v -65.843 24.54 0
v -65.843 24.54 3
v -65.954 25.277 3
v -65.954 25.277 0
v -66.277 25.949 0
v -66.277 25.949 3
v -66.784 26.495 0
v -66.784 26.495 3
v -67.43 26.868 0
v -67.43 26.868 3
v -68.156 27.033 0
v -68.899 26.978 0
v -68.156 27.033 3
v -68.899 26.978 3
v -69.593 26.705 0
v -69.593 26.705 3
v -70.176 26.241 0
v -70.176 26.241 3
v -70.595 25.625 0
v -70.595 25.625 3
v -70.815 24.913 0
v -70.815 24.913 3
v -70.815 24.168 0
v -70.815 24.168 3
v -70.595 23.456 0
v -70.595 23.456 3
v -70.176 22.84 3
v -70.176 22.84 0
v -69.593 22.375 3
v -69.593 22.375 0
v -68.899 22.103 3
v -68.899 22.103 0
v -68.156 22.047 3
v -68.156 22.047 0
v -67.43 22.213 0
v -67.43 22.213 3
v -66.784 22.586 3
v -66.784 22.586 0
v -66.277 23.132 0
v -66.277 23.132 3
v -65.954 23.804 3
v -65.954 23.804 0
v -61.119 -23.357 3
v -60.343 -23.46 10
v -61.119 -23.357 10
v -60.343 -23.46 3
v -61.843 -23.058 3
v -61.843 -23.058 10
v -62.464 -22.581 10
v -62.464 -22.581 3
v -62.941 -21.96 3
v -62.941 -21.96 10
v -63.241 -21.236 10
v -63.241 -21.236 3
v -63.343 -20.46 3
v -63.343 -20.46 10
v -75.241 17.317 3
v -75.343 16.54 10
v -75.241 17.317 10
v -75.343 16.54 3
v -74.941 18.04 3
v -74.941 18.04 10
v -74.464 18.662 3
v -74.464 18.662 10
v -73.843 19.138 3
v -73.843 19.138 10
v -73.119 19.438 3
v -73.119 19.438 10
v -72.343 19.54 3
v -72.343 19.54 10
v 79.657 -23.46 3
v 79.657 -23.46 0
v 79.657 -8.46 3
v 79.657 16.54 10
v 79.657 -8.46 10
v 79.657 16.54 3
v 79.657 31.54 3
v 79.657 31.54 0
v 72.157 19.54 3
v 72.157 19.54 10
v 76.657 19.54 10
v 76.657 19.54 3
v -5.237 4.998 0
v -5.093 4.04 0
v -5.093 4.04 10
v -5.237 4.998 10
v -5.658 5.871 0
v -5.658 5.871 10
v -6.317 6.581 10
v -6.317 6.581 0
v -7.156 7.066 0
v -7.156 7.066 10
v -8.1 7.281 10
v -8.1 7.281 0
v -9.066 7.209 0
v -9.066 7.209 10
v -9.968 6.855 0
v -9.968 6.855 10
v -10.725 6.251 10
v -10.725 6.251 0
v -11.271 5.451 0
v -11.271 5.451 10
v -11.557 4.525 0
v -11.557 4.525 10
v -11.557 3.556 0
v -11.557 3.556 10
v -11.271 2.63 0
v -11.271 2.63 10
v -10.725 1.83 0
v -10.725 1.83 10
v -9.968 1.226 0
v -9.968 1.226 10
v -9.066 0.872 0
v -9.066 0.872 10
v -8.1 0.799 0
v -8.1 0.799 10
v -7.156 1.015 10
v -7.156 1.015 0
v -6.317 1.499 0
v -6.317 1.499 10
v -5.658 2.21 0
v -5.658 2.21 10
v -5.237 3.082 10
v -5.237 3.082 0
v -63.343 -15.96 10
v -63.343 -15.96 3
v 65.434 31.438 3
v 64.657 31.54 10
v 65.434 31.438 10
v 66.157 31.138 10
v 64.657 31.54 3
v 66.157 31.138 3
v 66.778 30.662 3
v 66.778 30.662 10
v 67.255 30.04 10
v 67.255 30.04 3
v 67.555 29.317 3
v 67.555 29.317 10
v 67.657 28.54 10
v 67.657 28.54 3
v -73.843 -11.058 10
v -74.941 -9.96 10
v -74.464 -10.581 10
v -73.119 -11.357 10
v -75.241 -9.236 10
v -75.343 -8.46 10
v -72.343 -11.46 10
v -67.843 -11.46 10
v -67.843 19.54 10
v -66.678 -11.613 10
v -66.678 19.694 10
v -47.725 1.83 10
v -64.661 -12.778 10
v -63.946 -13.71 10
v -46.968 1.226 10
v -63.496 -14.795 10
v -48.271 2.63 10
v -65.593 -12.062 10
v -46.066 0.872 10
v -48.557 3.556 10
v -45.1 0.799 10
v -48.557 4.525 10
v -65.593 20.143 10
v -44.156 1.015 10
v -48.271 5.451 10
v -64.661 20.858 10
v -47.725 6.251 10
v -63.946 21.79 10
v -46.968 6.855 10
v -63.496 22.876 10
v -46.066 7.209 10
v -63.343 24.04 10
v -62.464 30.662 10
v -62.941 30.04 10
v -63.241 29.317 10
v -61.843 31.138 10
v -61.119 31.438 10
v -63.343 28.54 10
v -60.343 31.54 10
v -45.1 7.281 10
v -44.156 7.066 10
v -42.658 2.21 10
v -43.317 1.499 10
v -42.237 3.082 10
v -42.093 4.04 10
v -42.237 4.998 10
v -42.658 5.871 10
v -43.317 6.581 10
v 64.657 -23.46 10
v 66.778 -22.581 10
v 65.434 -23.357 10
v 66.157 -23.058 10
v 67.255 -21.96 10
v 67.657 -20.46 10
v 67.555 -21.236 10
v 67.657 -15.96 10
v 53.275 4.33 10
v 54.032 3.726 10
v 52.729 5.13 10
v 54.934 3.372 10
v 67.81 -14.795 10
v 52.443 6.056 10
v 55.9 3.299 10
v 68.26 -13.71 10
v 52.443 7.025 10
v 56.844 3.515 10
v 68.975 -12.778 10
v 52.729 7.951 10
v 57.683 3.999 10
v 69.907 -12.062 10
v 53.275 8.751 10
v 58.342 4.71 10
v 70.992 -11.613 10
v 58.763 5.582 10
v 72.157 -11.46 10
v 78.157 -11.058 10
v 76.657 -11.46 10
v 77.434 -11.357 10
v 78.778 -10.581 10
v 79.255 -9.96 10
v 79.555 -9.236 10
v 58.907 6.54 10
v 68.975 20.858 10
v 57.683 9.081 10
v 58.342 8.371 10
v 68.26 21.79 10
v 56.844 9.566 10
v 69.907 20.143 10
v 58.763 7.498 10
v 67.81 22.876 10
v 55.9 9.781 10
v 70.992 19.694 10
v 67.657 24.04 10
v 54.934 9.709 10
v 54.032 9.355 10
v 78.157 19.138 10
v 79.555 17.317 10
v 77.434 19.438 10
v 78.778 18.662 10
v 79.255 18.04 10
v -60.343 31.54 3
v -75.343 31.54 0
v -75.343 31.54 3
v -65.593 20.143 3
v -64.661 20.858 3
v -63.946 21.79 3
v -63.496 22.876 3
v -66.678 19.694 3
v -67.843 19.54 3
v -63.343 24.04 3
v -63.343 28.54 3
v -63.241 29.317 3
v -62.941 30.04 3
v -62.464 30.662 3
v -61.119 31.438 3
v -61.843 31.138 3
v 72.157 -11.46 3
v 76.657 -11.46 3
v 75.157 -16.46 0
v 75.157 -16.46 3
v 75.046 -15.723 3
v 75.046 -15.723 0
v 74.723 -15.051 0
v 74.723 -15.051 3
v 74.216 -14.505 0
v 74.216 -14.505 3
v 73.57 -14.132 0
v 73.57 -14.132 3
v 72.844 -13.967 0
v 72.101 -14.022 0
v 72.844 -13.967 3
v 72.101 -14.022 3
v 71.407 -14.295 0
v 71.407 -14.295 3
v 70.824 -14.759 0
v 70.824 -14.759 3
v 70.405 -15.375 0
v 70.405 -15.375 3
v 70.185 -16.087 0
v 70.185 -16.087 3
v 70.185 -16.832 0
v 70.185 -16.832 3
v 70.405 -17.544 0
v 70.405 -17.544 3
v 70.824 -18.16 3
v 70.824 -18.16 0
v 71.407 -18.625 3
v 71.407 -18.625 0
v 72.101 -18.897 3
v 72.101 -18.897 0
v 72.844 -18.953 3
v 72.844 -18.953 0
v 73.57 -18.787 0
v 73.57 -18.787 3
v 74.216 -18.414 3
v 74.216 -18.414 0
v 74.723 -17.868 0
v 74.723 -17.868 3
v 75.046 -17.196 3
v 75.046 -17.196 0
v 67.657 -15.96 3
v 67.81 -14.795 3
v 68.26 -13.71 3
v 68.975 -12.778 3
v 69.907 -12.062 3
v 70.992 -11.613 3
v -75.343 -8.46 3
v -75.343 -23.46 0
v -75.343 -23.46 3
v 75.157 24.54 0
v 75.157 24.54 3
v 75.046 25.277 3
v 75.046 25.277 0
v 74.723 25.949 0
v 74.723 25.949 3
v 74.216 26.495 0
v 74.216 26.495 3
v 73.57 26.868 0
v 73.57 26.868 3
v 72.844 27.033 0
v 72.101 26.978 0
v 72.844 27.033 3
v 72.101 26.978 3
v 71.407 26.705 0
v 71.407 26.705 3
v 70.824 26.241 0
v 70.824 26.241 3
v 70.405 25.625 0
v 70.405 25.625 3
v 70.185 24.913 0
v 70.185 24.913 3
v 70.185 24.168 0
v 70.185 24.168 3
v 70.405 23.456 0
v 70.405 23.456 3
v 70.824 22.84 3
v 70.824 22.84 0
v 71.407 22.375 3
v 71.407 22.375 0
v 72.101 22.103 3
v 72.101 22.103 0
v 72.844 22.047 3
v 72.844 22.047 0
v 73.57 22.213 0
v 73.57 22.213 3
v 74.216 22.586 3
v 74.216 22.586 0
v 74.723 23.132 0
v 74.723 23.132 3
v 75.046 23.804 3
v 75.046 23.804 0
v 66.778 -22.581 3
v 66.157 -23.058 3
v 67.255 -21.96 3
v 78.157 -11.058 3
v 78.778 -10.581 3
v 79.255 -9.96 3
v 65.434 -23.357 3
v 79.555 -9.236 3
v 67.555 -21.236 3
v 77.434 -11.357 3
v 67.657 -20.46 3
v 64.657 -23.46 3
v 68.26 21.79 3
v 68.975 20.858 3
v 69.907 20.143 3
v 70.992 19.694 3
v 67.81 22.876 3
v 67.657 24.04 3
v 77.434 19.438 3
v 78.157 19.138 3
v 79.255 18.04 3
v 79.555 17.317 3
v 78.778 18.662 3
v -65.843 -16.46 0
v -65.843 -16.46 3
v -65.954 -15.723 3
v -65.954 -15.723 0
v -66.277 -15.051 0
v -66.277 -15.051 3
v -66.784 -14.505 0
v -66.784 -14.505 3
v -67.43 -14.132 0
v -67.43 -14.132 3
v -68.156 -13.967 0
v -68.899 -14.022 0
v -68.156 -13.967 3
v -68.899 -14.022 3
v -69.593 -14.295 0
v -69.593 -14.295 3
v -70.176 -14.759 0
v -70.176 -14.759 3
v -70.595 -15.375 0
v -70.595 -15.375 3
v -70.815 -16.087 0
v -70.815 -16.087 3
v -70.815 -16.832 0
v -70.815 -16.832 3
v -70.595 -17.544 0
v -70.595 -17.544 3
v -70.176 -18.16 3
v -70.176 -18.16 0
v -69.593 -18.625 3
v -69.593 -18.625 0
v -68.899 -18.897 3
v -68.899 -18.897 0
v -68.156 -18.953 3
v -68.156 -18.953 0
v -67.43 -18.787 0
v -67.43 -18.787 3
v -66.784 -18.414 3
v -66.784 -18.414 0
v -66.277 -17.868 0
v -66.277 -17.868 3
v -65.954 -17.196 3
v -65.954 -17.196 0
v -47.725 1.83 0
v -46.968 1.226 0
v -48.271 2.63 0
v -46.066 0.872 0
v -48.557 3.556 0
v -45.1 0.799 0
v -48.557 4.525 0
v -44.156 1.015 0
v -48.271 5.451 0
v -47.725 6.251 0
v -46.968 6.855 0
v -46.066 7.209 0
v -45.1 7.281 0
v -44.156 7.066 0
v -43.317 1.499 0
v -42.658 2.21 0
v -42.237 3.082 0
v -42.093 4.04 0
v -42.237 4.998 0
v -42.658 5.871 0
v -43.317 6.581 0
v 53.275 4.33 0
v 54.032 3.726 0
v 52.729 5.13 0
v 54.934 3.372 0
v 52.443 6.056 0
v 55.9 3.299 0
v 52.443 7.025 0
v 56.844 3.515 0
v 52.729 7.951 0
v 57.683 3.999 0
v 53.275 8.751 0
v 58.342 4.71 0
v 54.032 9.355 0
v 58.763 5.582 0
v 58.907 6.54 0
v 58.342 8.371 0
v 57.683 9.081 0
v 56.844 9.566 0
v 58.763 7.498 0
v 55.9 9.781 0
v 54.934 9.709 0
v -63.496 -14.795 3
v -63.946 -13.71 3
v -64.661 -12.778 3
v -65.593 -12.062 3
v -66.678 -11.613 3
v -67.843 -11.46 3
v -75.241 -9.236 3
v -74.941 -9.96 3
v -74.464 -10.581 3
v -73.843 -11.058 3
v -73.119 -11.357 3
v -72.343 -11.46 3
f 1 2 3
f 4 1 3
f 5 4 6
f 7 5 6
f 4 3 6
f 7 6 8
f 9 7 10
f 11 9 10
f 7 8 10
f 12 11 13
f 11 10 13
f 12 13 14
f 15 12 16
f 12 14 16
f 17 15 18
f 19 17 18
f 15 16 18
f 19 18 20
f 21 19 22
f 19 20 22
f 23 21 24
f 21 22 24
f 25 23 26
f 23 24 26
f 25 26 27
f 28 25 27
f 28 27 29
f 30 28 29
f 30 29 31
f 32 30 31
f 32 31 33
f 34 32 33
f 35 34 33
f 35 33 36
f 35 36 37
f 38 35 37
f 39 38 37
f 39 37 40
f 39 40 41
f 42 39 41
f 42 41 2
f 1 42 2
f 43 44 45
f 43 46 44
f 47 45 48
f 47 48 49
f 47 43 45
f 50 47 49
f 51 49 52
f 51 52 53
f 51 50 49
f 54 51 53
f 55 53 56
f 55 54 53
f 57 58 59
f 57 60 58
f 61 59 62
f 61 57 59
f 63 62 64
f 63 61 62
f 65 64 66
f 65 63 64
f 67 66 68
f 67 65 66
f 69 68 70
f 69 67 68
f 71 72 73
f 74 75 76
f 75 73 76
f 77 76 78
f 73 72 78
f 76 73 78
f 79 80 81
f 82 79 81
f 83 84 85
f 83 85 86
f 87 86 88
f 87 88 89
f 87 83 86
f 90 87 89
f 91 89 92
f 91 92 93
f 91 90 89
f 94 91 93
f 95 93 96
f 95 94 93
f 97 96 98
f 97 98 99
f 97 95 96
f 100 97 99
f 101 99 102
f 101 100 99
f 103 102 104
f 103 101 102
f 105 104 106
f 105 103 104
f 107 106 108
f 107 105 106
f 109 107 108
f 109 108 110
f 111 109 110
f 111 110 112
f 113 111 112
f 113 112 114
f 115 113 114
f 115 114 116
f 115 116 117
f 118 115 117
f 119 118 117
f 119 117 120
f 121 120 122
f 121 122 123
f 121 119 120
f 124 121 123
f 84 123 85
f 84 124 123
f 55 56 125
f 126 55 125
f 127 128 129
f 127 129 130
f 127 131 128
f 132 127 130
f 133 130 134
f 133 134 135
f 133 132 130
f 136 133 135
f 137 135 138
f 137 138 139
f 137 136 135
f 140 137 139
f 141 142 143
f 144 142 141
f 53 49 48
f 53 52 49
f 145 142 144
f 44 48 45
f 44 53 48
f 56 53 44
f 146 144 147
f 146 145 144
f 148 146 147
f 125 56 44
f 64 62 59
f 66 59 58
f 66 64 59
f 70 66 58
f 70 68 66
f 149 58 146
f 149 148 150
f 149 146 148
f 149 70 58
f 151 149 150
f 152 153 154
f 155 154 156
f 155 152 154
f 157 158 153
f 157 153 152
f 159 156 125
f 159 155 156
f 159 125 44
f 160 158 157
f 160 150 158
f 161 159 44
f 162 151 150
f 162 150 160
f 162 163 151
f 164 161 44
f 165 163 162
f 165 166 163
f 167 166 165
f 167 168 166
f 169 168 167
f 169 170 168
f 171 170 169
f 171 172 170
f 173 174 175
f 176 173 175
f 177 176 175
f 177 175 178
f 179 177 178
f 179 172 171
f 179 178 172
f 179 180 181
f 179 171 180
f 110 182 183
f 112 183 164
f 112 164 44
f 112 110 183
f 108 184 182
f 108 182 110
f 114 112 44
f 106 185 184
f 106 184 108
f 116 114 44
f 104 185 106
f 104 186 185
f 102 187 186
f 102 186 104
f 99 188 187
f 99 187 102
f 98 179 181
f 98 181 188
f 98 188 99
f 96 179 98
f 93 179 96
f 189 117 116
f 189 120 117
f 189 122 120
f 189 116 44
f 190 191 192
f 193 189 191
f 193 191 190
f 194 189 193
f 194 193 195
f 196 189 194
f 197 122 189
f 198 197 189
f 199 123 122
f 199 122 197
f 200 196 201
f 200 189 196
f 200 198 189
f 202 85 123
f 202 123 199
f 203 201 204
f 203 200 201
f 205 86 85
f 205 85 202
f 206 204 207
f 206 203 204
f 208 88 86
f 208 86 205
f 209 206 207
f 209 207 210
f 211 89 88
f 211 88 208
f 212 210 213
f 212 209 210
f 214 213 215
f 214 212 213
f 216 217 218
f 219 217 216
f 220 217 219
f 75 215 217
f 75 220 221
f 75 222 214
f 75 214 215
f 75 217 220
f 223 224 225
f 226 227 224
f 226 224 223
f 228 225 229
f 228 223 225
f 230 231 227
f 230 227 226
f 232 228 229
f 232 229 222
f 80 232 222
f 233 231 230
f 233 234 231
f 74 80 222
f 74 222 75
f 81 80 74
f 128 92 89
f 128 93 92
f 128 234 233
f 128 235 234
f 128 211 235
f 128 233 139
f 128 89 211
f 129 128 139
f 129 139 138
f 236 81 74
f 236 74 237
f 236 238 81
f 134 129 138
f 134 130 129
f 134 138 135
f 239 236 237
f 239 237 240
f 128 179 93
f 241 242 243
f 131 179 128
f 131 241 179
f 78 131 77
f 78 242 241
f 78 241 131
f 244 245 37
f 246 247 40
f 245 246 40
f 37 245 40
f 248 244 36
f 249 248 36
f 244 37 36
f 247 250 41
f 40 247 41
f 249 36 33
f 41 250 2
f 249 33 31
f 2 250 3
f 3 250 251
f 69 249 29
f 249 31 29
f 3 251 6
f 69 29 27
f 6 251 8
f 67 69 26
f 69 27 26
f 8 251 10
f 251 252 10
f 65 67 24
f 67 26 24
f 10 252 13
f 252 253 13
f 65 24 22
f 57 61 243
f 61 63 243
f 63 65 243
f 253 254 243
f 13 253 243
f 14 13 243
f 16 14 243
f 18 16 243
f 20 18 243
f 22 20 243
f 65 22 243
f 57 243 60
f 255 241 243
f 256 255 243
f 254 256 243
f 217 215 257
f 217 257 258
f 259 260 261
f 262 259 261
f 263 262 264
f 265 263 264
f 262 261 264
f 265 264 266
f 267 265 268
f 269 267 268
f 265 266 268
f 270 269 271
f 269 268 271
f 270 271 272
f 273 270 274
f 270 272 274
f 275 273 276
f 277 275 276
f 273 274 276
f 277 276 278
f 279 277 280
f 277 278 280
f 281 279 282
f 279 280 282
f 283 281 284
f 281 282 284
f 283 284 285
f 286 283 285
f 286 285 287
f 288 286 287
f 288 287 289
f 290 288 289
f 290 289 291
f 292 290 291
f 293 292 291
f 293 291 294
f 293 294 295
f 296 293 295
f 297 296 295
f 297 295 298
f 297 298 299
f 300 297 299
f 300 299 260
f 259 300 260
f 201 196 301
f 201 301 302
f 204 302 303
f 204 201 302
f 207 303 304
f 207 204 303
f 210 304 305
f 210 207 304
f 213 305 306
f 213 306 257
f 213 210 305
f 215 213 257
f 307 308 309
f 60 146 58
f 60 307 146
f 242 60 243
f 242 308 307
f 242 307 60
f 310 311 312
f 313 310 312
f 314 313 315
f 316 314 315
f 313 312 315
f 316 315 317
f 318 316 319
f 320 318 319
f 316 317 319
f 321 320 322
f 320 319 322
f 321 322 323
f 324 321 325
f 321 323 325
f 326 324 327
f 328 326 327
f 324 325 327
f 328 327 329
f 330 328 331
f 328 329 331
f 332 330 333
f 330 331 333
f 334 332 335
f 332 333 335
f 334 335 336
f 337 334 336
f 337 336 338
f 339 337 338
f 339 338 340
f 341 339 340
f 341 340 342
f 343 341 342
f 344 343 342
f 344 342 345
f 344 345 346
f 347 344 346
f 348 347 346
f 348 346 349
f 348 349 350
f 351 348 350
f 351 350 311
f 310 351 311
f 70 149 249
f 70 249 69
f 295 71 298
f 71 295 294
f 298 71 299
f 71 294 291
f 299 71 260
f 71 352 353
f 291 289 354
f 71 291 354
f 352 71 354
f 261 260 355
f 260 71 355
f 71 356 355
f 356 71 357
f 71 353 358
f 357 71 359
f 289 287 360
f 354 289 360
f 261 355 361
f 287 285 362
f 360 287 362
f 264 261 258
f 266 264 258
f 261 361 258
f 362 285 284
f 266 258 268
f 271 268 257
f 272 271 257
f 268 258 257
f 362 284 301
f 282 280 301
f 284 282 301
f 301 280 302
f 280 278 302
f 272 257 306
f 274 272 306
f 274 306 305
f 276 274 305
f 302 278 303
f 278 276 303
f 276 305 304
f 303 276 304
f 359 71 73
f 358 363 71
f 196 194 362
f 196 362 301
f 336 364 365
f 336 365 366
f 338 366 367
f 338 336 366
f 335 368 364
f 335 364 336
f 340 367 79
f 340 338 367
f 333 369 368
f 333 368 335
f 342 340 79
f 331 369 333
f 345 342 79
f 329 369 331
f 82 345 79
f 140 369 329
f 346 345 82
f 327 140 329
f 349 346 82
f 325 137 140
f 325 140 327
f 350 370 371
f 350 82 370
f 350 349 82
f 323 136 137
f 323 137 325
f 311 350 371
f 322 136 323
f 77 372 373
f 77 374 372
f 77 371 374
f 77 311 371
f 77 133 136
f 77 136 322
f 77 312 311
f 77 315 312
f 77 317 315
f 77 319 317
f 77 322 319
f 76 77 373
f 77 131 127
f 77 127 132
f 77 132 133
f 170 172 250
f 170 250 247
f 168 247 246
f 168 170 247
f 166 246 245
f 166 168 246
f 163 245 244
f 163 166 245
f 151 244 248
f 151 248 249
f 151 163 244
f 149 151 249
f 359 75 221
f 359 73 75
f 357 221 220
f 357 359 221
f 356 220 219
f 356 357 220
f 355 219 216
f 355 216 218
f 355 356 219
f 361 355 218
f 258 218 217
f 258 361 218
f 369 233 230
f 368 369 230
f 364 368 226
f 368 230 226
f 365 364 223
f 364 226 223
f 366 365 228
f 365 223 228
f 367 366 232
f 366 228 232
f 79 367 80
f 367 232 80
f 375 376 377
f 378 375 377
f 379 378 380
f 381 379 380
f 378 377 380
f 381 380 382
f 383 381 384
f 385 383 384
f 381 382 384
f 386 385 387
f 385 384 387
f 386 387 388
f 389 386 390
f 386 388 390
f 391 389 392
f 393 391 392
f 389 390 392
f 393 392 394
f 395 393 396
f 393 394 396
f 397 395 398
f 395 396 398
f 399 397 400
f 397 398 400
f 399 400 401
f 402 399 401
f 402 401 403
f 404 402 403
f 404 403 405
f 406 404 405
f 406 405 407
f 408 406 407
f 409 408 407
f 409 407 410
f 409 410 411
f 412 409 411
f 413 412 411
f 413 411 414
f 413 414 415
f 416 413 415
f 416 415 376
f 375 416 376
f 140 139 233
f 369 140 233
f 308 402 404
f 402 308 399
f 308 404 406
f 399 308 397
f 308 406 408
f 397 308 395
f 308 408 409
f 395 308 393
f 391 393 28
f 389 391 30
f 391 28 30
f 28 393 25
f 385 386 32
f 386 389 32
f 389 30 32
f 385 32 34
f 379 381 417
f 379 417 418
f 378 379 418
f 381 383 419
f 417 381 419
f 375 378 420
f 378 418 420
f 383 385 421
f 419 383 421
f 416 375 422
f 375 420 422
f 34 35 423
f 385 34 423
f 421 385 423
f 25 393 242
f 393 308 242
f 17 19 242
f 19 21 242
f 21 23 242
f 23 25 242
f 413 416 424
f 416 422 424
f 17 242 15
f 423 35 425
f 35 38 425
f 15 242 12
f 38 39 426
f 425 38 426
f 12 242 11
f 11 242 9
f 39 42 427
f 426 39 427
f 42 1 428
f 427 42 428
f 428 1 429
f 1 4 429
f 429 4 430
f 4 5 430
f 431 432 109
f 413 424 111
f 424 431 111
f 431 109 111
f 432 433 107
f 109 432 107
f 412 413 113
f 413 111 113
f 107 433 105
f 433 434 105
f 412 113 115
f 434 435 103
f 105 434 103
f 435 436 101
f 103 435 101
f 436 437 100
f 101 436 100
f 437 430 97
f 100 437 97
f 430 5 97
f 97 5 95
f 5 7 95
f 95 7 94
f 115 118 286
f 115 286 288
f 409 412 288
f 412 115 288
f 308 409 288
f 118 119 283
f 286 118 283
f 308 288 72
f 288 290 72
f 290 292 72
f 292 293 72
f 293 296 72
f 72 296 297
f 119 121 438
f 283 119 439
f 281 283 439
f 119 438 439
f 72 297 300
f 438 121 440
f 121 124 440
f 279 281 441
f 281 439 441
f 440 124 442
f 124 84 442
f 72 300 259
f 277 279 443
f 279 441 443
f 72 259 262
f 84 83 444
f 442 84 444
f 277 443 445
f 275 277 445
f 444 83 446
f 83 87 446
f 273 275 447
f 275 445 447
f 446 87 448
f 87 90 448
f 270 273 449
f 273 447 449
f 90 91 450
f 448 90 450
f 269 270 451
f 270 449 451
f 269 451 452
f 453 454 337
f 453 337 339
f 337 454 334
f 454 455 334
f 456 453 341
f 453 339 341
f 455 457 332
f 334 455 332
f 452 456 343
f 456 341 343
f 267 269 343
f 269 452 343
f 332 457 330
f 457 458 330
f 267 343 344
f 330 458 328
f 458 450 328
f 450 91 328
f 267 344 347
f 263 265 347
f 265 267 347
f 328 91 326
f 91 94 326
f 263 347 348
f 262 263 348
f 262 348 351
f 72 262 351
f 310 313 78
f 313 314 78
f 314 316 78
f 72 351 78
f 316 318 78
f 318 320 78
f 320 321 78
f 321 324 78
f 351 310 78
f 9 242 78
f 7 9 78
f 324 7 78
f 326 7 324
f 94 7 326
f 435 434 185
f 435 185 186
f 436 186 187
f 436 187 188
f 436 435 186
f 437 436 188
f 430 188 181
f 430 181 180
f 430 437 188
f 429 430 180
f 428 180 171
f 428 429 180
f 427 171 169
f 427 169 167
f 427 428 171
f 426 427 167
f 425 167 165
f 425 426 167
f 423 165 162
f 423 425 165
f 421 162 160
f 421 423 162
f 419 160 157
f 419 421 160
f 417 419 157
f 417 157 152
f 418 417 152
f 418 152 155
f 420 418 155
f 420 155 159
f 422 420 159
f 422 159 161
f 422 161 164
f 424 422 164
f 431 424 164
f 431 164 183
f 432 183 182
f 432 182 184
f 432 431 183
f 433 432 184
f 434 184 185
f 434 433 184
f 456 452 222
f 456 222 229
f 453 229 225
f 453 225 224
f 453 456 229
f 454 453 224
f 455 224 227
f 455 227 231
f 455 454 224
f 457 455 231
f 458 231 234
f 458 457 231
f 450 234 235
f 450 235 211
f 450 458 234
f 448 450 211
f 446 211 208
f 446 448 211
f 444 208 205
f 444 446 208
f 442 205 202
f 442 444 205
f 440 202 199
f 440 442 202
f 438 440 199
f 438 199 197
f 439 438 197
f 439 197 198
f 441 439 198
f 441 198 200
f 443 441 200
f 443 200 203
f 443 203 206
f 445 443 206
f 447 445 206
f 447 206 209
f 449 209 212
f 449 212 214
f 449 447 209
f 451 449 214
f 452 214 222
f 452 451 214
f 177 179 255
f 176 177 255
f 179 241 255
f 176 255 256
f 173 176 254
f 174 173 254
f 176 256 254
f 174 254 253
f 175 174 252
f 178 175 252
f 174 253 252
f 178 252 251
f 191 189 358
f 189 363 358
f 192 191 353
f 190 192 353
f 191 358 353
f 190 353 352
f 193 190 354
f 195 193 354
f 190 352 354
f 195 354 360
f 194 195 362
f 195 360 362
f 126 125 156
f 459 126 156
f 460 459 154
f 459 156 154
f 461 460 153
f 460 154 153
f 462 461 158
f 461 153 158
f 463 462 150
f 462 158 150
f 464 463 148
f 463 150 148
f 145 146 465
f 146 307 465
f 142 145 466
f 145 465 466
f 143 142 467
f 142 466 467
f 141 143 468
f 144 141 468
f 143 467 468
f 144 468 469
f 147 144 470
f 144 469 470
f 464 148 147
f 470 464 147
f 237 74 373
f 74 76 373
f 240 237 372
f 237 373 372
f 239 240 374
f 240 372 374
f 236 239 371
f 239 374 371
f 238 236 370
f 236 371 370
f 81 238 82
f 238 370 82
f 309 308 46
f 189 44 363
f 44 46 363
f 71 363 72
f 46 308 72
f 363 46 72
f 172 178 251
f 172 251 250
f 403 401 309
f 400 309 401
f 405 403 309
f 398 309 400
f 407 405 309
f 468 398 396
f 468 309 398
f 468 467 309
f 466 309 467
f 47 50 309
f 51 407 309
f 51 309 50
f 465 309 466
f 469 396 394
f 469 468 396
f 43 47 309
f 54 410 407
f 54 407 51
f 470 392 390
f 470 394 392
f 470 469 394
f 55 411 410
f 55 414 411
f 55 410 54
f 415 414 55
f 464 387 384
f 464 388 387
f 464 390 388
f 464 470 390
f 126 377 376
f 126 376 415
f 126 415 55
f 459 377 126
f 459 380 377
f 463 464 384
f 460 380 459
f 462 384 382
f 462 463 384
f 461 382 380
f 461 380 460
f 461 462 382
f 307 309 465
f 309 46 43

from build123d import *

# Parameters (mm, degrees)
SKETCH1_W           = 155
SKETCH1_H           = 55
SKETCH1_R           = 3.25
BOSS_EXTRUDE1_DEPTH = 10
CUT_EXTRUDE1_DEPTH  = 7
SKETCH3_R           = 2.5
CUT_EXTRUDE2_DEPTH  = 10
FILLET1_R           = 3


with BuildPart() as part:
    # Sketch1 → Boss-Extrude1 (new body)
    with BuildSketch(Plane.XY):
        with Locations((2.15707133, 4.04038984)):
            Rectangle(SKETCH1_W, SKETCH1_H)
        with Locations((-45.34292867, 4.04038984)):
            Circle(SKETCH1_R, mode=Mode.SUBTRACT)
        with Locations((-8.34292867, 4.04038984)):
            Circle(SKETCH1_R, mode=Mode.SUBTRACT)
        with Locations((55.65707133, 6.54038984)):
            Circle(SKETCH1_R, mode=Mode.SUBTRACT)
    extrude(amount=BOSS_EXTRUDE1_DEPTH)

    # Sketch2 → Cut-Extrude1 (cut)
    with BuildSketch(Plane.XY.offset(10)):
        with BuildLine():
            Line((-75.34292867, 31.54038984), (-63.34292867, 31.54038984))
            Line((-63.34292867, 31.54038984), (-63.34292867, 24.04038984))
            ThreePointArc((-63.34292867, 24.04038984), (-64.660948155, 20.858409325), (-67.84292867, 19.54038984))
            Line((-67.84292867, 19.54038984), (-75.34292867, 19.54038984))
            Line((-75.34292867, 19.54038984), (-75.34292867, 31.54038984))
        make_face()
        with BuildLine():
            Line((-75.34292867, -23.45961016), (-63.34292867, -23.45961016))
            Line((-63.34292867, -23.45961016), (-63.34292867, -15.95961016))
            ThreePointArc((-63.34292867, -15.95961016), (-64.660948155, -12.777629645), (-67.84292867, -11.45961016))
            Line((-67.84292867, -11.45961016), (-75.34292867, -11.45961016))
            Line((-75.34292867, -11.45961016), (-75.34292867, -23.45961016))
        make_face()
        with BuildLine():
            Line((79.65707133, -23.45961016), (67.65707133, -23.45961016))
            Line((67.65707133, -23.45961016), (67.65707133, -15.95961016))
            ThreePointArc((67.65707133, -15.95961016), (68.975090815, -12.777629645), (72.15707133, -11.45961016))
            Line((72.15707133, -11.45961016), (79.65707133, -11.45961016))
            Line((79.65707133, -11.45961016), (79.65707133, -23.45961016))
        make_face()
        with BuildLine():
            Line((79.65707133, 31.54038984), (67.65707133, 31.54038984))
            Line((67.65707133, 31.54038984), (67.65707133, 24.04038984))
            ThreePointArc((67.65707133, 24.04038984), (68.975090815, 20.858409325), (72.15707133, 19.54038984))
            Line((72.15707133, 19.54038984), (79.65707133, 19.54038984))
            Line((79.65707133, 19.54038984), (79.65707133, 31.54038984))
        make_face()
    extrude(amount=-CUT_EXTRUDE1_DEPTH, mode=Mode.SUBTRACT)

    # Sketch3 → Cut-Extrude2 (cut)
    with BuildSketch(Plane.XY.offset(3)):
        with Locations((-68.34292867, -16.45961016)):
            Circle(SKETCH3_R)
        with Locations((72.65707133, -16.45961016)):
            Circle(SKETCH3_R)
        with Locations((72.65707133, 24.54038984)):
            Circle(SKETCH3_R)
        with Locations((-68.34292867, 24.54038984)):
            Circle(SKETCH3_R)
    extrude(amount=-CUT_EXTRUDE2_DEPTH, mode=Mode.SUBTRACT)

    # Fillet1
    fillet1_edges = [part.edges().sort_by_distance(p)[0] for p in [
        (79.65707133, 19.54038984, 6.5),
        (67.65707133, 31.54038984, 6.5),
        (79.65707133, -11.45961016, 6.5),
        (67.65707133, -23.45961016, 6.5),
        (-75.34292867, -11.45961016, 6.5),
        (-63.34292867, -23.45961016, 6.5),
        (-75.34292867, 19.54038984, 6.5),
        (-63.34292867, 31.54038984, 6.5),
    ]]
    fillet(fillet1_edges, radius=FILLET1_R)


solid = part.part
